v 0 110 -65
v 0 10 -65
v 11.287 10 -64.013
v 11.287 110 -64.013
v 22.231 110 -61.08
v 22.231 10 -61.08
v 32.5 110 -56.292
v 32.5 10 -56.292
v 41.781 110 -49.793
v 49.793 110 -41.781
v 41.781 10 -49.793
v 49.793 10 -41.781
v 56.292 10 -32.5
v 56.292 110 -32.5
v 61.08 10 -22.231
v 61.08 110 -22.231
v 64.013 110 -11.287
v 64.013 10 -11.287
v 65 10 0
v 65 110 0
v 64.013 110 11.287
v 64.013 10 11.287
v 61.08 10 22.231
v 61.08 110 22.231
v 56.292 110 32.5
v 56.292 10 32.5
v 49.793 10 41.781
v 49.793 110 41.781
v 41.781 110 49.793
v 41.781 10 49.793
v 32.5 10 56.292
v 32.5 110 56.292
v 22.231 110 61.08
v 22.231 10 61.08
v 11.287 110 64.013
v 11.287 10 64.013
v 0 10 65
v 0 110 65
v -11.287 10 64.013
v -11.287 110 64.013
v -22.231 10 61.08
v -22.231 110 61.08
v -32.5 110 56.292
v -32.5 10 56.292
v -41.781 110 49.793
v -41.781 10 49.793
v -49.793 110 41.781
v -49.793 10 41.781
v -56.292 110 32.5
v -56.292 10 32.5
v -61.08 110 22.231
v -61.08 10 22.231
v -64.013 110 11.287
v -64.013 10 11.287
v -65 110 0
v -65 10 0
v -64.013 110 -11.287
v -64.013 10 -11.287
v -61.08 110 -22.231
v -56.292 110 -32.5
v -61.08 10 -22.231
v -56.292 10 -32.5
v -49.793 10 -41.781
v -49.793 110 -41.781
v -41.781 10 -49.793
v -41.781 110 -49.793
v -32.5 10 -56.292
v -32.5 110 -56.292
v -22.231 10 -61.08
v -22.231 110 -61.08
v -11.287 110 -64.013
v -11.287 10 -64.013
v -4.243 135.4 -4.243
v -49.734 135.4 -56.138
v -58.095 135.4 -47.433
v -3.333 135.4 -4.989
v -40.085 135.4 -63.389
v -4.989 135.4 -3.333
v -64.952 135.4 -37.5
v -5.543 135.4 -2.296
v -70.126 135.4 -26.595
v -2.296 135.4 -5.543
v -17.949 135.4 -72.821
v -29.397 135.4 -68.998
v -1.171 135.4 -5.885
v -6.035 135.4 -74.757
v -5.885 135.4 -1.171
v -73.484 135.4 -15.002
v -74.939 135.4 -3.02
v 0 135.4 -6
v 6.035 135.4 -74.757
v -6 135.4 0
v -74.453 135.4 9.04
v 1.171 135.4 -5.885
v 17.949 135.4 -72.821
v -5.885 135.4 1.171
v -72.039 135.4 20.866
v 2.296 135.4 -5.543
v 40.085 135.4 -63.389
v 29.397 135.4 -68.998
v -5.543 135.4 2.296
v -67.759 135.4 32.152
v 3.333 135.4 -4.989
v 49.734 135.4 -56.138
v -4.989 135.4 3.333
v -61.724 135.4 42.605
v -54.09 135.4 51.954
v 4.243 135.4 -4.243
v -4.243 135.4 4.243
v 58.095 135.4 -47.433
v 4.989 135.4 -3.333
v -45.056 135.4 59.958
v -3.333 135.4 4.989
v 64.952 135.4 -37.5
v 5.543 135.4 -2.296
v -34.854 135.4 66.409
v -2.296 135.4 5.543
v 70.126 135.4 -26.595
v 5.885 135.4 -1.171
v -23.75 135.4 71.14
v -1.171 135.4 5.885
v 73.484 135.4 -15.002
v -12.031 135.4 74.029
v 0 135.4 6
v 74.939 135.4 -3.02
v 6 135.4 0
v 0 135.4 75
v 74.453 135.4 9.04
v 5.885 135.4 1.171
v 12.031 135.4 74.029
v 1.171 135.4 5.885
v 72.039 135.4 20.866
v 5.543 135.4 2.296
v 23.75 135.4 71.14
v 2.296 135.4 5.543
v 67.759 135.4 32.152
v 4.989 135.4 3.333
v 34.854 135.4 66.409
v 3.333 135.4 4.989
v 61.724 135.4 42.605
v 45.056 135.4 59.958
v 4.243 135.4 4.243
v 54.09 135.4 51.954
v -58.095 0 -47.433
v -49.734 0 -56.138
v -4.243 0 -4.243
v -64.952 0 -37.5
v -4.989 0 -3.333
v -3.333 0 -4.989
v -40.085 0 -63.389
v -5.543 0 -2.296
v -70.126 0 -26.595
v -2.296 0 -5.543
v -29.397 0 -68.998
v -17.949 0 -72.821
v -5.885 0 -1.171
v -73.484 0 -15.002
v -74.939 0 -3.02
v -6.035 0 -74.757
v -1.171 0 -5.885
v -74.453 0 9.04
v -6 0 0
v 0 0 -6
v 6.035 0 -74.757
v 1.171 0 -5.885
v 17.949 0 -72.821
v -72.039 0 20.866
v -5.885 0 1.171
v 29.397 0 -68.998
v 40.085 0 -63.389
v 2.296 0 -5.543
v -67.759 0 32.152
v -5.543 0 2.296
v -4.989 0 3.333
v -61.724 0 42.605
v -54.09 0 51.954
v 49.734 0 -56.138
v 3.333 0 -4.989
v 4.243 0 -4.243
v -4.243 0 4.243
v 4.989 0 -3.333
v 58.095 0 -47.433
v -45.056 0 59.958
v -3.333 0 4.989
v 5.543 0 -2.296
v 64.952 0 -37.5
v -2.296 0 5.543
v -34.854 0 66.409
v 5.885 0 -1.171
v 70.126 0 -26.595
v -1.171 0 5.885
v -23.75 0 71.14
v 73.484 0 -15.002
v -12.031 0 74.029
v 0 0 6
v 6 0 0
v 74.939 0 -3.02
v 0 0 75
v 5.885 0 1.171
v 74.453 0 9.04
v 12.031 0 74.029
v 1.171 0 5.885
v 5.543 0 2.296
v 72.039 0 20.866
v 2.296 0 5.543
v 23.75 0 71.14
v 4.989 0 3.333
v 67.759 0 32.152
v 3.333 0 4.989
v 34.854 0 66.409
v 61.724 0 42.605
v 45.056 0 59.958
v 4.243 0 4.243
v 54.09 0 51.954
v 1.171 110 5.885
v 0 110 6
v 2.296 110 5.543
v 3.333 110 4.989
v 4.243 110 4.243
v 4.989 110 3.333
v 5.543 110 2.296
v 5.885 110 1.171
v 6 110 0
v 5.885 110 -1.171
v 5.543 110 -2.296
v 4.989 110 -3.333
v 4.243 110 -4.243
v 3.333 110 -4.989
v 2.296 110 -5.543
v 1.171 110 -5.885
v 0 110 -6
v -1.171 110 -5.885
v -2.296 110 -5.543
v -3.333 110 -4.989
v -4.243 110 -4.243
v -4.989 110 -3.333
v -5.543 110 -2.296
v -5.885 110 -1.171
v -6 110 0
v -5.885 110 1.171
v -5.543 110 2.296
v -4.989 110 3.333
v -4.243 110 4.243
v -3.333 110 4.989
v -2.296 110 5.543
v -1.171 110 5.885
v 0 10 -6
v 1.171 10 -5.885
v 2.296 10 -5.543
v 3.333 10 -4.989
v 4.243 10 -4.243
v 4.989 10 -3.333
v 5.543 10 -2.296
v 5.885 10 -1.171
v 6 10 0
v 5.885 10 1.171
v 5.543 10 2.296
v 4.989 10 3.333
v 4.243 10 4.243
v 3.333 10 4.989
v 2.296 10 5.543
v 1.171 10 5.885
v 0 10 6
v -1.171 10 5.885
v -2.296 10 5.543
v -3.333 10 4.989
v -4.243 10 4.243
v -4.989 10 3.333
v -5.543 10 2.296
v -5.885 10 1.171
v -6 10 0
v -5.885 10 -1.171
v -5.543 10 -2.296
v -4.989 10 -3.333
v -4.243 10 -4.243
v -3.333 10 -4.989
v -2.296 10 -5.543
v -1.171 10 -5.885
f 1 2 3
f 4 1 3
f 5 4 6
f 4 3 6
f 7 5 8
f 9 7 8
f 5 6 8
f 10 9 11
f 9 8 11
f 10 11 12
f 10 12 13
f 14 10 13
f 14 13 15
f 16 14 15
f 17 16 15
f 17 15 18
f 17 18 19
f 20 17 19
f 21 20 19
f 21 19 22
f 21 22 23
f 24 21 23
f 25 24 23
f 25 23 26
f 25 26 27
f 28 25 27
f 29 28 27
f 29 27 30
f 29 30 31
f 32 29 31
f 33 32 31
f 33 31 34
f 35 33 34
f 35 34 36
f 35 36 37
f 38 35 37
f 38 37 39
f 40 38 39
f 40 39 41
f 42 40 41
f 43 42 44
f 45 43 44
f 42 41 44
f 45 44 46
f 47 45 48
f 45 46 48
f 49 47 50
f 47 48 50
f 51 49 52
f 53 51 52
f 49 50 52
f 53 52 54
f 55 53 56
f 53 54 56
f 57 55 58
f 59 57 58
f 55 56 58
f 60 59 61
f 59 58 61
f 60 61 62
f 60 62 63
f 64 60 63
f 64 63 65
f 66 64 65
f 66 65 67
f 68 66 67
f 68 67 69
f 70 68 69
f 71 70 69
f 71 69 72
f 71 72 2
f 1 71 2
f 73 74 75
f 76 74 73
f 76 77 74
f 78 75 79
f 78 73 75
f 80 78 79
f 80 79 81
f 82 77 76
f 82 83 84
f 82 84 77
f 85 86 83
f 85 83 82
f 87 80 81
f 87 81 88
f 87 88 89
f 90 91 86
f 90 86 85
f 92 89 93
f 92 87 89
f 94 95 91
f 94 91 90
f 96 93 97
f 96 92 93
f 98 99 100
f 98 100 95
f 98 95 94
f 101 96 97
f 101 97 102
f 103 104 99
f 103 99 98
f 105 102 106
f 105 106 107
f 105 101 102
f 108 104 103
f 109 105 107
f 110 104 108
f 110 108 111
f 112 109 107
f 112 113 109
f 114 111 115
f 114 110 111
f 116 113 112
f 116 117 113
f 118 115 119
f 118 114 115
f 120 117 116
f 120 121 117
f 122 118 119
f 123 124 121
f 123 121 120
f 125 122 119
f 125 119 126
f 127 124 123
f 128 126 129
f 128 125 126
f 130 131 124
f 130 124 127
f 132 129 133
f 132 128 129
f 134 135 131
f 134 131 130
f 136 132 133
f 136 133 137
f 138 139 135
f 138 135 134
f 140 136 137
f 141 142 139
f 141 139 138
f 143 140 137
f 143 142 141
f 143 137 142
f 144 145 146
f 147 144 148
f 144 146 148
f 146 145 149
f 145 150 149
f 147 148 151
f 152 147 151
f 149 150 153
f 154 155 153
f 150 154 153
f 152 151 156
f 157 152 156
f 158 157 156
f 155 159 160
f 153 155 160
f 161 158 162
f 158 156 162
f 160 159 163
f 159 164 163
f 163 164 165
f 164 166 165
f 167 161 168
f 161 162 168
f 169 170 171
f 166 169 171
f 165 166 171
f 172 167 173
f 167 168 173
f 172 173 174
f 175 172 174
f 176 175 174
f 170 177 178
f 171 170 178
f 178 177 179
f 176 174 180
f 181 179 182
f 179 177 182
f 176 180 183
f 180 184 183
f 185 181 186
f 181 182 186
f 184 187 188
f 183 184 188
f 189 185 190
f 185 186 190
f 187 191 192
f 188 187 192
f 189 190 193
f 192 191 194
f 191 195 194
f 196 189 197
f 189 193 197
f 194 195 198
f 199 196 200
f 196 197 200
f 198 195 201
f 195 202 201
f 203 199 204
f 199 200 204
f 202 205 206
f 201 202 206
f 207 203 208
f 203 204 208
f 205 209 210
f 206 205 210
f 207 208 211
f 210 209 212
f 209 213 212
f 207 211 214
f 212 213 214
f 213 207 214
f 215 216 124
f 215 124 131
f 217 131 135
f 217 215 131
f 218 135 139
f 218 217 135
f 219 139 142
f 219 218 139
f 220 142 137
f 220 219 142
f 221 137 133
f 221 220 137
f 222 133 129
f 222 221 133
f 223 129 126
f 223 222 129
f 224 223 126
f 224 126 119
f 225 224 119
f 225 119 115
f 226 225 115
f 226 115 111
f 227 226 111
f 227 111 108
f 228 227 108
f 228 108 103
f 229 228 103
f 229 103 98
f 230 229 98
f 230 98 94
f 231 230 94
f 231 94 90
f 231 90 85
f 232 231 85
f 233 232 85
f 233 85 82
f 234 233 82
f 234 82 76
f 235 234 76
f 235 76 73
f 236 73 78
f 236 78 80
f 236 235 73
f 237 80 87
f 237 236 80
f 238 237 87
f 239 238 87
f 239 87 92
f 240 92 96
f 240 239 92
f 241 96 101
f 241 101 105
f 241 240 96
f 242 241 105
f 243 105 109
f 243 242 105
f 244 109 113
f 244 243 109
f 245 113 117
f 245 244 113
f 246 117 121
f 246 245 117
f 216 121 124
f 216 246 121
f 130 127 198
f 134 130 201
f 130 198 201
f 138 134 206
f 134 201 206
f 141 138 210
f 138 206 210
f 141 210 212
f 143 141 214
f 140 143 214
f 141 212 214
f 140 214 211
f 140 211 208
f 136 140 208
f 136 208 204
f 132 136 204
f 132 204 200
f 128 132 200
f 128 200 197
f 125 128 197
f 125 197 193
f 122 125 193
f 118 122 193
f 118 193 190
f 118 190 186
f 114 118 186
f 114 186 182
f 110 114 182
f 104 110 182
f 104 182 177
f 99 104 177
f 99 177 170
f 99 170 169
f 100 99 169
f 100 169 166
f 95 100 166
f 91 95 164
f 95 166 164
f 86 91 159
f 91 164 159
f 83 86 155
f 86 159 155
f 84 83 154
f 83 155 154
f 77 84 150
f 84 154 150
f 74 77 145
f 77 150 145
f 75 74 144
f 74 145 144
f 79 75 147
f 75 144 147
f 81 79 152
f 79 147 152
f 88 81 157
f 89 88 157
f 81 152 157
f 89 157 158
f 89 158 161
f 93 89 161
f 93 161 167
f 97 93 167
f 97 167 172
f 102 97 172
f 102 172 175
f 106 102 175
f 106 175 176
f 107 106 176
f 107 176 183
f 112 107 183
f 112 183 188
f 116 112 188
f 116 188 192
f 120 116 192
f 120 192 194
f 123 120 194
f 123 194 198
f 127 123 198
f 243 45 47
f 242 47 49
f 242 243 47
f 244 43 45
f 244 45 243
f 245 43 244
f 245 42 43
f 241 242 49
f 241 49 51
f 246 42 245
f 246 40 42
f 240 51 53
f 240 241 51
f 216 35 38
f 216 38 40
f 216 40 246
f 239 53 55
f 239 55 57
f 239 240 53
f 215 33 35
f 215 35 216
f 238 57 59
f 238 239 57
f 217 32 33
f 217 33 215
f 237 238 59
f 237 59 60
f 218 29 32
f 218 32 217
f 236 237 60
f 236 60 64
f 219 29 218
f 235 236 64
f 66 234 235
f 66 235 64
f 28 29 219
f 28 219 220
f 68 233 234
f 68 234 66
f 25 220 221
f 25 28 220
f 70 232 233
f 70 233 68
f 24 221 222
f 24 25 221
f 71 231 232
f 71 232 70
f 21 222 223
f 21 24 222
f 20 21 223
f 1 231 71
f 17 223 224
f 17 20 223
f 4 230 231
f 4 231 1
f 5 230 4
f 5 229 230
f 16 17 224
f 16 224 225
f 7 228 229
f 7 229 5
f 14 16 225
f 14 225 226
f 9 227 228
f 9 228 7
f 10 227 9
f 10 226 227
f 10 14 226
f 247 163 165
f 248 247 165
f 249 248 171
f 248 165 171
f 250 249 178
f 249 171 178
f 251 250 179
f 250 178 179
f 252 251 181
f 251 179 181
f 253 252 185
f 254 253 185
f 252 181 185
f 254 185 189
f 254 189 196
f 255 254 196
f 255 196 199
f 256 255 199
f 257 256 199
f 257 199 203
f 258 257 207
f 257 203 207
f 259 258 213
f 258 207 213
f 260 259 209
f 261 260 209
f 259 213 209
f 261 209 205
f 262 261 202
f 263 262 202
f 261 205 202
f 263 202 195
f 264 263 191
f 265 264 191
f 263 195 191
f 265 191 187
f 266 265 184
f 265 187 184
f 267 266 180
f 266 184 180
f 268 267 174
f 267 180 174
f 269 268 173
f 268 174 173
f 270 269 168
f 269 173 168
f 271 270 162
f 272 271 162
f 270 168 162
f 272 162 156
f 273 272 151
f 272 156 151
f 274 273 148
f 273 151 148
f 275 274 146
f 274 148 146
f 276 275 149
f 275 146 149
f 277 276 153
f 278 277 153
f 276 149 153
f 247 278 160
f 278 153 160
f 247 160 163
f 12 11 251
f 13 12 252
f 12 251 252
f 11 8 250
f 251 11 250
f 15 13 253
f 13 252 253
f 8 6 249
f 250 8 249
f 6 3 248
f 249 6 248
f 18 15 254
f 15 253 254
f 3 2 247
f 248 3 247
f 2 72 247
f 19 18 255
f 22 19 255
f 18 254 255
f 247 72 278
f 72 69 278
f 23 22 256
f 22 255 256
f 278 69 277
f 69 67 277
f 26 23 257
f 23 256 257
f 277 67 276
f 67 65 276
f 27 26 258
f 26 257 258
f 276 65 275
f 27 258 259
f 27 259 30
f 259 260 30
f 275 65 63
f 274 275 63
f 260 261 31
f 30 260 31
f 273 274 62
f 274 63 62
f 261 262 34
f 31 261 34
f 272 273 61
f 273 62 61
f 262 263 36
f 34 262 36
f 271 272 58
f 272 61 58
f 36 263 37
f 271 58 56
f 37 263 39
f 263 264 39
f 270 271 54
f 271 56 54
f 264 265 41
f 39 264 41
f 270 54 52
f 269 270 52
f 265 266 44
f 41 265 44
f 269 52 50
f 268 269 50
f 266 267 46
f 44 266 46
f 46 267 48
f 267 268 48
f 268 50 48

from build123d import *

# Parameters (mm, degrees)
SKETCH1_R           = 75
SKETCH1_R_2         = 6
BOSS_EXTRUDE1_DEPTH = 135.4
SKETCH3_R           = 65
CUT_EXTRUDE2_DEPTH  = 110
SKETCH4_R           = 75
SKETCH4_R_2         = 6
BOSS_EXTRUDE2_DEPTH = 10


with BuildPart() as part:
    # Sketch1 → Boss-Extrude1 (new body)
    with BuildSketch(Plane(origin=(0, 0, 0), x_dir=(1, 0, 0), z_dir=(0, 1, 0))):
        with Locations(Location((0, 0, 0), (0, 0, 270))):
            Circle(SKETCH1_R)
        with Locations(Location((0, 0, 0), (0, 0, 270))):
            Circle(SKETCH1_R_2, mode=Mode.SUBTRACT)
    extrude(amount=BOSS_EXTRUDE1_DEPTH)

    # Sketch3 → Cut-Extrude2 (cut)
    with BuildSketch(Plane.XZ):
        with Locations(Location((0, 0, 0), (0, 0, 270))):
            Circle(SKETCH3_R)
    extrude(amount=-CUT_EXTRUDE2_DEPTH, mode=Mode.SUBTRACT)

    # Sketch4 → Boss-Extrude2 (add)
    with BuildSketch(Plane.XZ):
        with Locations(Location((0, 0, 0), (0, 0, 90))):
            Circle(SKETCH4_R)
        with Locations(Location((0, 0, 0), (0, 0, 270))):
            Circle(SKETCH4_R_2, mode=Mode.SUBTRACT)
    extrude(amount=-BOSS_EXTRUDE2_DEPTH)


solid = part.part
